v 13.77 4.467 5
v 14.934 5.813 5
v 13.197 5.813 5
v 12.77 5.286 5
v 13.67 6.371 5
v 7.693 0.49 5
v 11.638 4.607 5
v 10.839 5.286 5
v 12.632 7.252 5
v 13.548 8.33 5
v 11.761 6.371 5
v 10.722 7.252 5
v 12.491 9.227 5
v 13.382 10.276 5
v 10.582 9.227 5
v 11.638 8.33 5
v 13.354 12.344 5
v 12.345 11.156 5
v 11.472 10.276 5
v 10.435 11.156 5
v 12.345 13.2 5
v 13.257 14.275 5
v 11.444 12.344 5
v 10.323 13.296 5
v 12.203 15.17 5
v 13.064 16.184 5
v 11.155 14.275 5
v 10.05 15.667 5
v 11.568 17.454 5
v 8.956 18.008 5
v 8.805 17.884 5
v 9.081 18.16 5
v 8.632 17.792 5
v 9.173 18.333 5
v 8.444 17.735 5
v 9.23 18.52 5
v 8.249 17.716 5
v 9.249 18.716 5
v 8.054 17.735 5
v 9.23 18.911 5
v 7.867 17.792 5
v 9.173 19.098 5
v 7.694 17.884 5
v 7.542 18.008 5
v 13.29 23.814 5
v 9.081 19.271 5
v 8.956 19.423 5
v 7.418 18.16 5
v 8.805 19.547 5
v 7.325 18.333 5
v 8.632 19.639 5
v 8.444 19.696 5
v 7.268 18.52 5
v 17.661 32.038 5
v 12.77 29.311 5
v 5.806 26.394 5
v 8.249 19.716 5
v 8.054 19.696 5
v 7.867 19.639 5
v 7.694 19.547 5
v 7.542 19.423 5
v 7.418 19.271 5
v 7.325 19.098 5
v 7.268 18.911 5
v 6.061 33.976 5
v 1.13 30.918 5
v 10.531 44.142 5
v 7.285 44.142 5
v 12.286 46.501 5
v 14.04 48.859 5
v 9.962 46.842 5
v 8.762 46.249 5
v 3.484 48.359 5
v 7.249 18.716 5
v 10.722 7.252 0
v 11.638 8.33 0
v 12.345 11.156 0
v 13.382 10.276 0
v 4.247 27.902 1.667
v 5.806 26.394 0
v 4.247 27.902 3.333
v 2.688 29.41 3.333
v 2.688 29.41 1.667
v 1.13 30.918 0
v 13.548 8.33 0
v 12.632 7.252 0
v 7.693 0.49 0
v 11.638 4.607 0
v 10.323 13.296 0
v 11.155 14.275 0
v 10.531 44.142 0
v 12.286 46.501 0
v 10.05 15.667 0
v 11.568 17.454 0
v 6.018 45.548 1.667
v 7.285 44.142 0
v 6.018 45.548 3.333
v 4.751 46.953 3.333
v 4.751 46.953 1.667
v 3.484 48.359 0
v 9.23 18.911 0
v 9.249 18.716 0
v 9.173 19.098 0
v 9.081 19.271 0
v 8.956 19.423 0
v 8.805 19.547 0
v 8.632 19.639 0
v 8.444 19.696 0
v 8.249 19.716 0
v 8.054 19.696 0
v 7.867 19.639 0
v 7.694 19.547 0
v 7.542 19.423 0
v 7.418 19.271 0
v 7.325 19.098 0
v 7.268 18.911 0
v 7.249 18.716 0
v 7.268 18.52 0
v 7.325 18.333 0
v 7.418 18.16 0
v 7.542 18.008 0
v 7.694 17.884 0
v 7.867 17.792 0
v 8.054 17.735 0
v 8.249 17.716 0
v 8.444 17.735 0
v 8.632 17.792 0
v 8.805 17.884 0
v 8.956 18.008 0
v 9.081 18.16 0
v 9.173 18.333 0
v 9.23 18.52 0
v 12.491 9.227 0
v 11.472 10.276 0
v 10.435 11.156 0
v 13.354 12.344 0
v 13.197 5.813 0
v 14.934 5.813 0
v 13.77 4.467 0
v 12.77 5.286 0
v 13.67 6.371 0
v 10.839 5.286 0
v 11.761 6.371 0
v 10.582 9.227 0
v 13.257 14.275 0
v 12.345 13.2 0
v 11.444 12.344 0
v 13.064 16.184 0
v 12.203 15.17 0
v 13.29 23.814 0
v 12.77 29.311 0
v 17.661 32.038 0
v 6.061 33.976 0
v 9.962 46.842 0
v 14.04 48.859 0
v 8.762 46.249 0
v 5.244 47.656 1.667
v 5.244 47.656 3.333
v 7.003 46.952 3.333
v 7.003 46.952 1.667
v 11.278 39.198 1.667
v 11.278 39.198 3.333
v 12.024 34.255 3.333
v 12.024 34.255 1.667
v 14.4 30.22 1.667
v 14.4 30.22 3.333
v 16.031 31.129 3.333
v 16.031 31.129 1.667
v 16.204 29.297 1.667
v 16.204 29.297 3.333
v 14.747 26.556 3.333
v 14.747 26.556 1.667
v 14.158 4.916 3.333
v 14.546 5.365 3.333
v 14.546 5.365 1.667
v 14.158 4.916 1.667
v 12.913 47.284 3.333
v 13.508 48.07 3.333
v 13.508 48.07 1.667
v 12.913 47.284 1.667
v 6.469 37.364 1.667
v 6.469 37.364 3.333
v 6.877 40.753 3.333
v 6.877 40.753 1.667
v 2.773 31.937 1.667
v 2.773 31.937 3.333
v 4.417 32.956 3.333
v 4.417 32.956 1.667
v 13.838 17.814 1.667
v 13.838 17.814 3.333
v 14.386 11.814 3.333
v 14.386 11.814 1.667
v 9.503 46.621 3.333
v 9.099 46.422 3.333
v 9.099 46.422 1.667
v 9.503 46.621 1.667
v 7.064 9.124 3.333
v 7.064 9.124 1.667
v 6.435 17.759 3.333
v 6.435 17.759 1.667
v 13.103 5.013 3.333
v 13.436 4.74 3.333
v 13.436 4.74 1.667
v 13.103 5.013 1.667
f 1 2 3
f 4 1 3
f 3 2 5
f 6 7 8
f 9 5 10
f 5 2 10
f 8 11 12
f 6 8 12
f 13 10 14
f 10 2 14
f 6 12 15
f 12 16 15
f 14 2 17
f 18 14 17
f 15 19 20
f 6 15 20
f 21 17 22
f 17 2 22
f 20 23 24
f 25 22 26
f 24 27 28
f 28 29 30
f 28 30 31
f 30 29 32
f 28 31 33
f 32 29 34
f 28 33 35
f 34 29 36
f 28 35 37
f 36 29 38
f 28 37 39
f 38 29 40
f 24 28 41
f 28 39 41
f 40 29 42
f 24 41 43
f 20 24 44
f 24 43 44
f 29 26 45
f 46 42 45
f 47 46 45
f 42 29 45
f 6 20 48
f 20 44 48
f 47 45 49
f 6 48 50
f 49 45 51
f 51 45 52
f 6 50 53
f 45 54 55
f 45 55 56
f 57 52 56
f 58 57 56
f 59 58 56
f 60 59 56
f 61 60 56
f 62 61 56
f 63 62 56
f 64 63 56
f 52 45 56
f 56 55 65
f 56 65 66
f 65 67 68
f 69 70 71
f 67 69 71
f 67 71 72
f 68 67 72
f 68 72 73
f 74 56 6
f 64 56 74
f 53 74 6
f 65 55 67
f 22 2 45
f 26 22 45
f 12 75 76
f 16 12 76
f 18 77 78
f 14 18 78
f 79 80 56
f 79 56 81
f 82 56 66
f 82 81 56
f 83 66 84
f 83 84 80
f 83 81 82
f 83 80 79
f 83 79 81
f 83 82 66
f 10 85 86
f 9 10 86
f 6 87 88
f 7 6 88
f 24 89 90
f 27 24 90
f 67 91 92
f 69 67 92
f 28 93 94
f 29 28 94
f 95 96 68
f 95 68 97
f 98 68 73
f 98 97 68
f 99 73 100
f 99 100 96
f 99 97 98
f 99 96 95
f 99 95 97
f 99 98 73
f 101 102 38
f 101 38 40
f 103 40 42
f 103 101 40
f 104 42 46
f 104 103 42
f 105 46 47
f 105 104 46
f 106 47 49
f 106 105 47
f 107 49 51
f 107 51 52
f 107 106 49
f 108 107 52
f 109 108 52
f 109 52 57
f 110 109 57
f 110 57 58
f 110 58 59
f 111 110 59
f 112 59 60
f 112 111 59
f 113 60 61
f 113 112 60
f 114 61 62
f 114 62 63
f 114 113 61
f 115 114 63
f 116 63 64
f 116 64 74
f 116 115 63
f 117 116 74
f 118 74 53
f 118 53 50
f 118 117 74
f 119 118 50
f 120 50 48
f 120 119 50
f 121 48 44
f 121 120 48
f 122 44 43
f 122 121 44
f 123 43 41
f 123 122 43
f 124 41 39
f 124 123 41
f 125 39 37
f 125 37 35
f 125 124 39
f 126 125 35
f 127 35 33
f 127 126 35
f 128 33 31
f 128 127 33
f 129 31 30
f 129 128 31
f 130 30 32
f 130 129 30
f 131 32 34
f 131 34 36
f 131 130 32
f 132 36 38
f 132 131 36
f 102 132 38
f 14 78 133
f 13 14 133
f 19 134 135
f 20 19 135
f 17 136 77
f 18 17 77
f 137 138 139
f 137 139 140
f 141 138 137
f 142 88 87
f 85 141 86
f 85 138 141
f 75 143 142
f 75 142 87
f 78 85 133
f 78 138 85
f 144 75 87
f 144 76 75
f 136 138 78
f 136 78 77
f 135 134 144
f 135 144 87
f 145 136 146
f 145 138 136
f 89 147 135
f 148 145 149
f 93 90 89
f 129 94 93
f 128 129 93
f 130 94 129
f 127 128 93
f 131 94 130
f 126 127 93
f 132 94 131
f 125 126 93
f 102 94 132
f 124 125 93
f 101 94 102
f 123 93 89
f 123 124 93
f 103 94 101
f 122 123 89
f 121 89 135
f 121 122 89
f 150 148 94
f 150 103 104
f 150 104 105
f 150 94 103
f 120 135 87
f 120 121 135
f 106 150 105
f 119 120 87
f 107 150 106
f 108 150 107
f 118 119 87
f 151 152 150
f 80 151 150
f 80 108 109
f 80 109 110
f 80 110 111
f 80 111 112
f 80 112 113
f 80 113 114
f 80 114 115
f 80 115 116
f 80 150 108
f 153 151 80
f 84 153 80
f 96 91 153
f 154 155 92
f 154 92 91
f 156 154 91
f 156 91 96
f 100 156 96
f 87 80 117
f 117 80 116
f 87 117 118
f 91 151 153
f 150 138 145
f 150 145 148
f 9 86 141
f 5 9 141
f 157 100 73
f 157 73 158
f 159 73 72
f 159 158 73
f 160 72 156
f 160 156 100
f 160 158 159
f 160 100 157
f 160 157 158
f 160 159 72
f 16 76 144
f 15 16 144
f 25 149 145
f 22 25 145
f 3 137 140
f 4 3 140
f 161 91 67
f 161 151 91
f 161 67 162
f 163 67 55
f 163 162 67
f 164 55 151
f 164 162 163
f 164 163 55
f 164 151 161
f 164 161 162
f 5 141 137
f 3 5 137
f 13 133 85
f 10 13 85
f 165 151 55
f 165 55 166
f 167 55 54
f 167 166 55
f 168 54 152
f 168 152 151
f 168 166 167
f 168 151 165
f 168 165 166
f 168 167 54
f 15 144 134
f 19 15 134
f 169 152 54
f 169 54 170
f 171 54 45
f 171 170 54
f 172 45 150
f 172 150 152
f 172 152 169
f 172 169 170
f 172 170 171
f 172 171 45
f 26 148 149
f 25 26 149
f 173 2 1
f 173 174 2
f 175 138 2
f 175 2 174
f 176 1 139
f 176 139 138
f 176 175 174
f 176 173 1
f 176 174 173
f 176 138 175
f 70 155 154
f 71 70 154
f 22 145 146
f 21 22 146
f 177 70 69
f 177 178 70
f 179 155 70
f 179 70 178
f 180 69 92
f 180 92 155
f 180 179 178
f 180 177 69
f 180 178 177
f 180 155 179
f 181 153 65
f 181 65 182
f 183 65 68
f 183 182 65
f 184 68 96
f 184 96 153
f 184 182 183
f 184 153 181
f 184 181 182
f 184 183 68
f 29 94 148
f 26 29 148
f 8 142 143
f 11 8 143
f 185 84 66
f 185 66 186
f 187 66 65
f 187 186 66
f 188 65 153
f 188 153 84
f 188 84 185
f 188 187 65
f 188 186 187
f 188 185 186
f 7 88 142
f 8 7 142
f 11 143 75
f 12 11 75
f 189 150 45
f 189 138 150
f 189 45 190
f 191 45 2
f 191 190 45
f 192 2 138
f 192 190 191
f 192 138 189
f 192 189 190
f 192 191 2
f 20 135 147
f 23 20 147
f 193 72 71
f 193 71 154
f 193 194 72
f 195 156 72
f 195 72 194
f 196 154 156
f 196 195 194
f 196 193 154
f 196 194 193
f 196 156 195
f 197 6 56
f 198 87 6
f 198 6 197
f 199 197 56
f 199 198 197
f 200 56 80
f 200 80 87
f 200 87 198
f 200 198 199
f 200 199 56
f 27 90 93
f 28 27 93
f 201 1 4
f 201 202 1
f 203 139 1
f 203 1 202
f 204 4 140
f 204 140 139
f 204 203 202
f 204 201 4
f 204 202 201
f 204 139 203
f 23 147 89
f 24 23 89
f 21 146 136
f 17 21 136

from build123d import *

# Parameters (mm, degrees)
F0_R     = 1
F1_DEPTH = 5


with BuildPart() as f1:
    # F0 (on Top) → F1 (new body)
    with BuildSketch(Plane.XY):
        with BuildLine():
            add(Edge.make_bspline(
                [(7.693045, 0.489857), (7.064082, 9.124408), (6.435119, 17.758959), (5.806156, 26.39351)],
                knots=[0, 0, 0, 0, 25.972286, 25.972286, 25.972286, 25.972286], degree=3))
            Line((7.693045, 0.489857), (11.638039, 4.607475))
            Line((11.638039, 4.607475), (10.839293, 5.28573))
            Line((10.839293, 5.28573), (11.760553, 6.370649))
            Line((11.760553, 6.370649), (10.722407, 7.252192))
            Line((10.722407, 7.252192), (11.638039, 8.330484))
            Line((11.638039, 8.330484), (10.581676, 9.227495))
            Line((10.581676, 9.227495), (11.471978, 10.275956))
            Line((11.471978, 10.275956), (10.435367, 11.156196))
            Line((10.435367, 11.156196), (11.443965, 12.343969))
            Line((11.443965, 12.343969), (10.32334, 13.295549))
            Line((10.32334, 13.295549), (11.154807, 14.274724))
            Line((11.154807, 14.274724), (10.050478, 15.66664))
            Line((10.050478, 15.66664), (11.568329, 17.454133))
            Line((11.568329, 17.454133), (13.063904, 16.184165))
            Line((13.063904, 16.184165), (12.202819, 15.170112))
            Line((12.202819, 15.170112), (13.257269, 14.274724))
            Line((13.257269, 14.274724), (12.345023, 13.200421))
            Line((12.345023, 13.200421), (13.353622, 12.343969))
            Line((13.353622, 12.343969), (12.345023, 11.156196))
            Line((12.345023, 11.156196), (13.381635, 10.275956))
            Line((13.381635, 10.275956), (12.491333, 9.227495))
            Line((12.491333, 9.227495), (13.547695, 8.330484))
            Line((13.547695, 8.330484), (12.632063, 7.252192))
            Line((12.632063, 7.252192), (13.67021, 6.370649))
            Line((13.67021, 6.370649), (13.197073, 5.813461))
            Line((13.197073, 5.813461), (12.770227, 5.28573))
            add(Edge.make_bspline(
                [(13.769604, 4.466838), (13.436479, 4.739802), (13.103353, 5.012766), (12.770227, 5.28573)],
                knots=[0, 0, 0, 0, 1.292029, 1.292029, 1.292029, 1.292029], degree=3))
            add(Edge.make_bspline(
                [(14.934251, 5.813461), (14.546035, 5.364587), (14.15782, 4.915712), (13.769604, 4.466838)],
                knots=[0, 0, 0, 0, 1.780392, 1.780392, 1.780392, 1.780392], degree=3))
            add(Edge.make_bspline(
                [(13.289604, 23.814345), (13.83782, 17.81405), (14.386036, 11.813755), (14.934251, 5.813461)],
                knots=[0, 0, 0, 0, 18.075859, 18.075859, 18.075859, 18.075859], degree=3))
            add(Edge.make_bspline(
                [(17.661029, 32.037817), (16.203888, 29.29666), (14.746746, 26.555502), (13.289604, 23.814345)],
                knots=[0, 0, 0, 0, 9.313155, 9.313155, 9.313155, 9.313155], degree=3))
            add(Edge.make_bspline(
                [(12.770227, 29.311087), (14.400495, 30.219997), (16.030762, 31.128907), (17.661029, 32.037817)],
                knots=[0, 0, 0, 0, 5.599554, 5.599554, 5.599554, 5.599554], degree=3))
            add(Edge.make_bspline(
                [(10.531368, 44.142015), (11.277654, 39.198373), (12.023941, 34.25473), (12.770227, 29.311087)],
                knots=[0, 0, 0, 0, 14.998964, 14.998964, 14.998964, 14.998964], degree=3))
            add(Edge.make_bspline(
                [(12.2857, 46.500597), (11.653371, 45.717337), (11.021041, 44.934078), (10.531368, 44.142015)],
                knots=[2.939488, 2.939488, 2.939488, 2.939488, 5.878976, 5.878976, 5.878976, 5.878976], degree=3))
            Line((12.2857, 46.500597), (14.040033, 48.859179))
            add(Edge.make_bspline(
                [(9.96209, 46.84221), (11.217791, 47.44206), (12.906654, 48.222175), (14.040033, 48.859179)],
                knots=[1.635184, 1.635184, 1.635184, 1.635184, 5.888303, 5.888303, 5.888303, 5.888303], degree=3))
            Line((9.96209, 46.84221), (8.762033, 46.248656))
            add(Edge.make_bspline(
                [(3.484468, 48.358951), (5.243656, 47.655519), (7.002845, 46.952087), (8.762033, 46.248656)],
                knots=[0, 0, 0, 0, 5.68384, 5.68384, 5.68384, 5.68384], degree=3))
            add(Edge.make_bspline(
                [(7.285437, 44.142015), (6.018447, 45.54766), (4.751458, 46.953306), (3.484468, 48.358951)],
                knots=[0, 0, 0, 0, 5.677139, 5.677139, 5.677139, 5.677139], degree=3))
            add(Edge.make_bspline(
                [(6.060782, 33.975713), (6.469, 37.36448), (6.877219, 40.753248), (7.285437, 44.142015)],
                knots=[0, 0, 0, 0, 10.239799, 10.239799, 10.239799, 10.239799], degree=3))
            add(Edge.make_bspline(
                [(1.129528, 30.918069), (2.773279, 31.937284), (4.417031, 32.956498), (6.060782, 33.975713)],
                knots=[0, 0, 0, 0, 5.80228, 5.80228, 5.80228, 5.80228], degree=3))
            add(Edge.make_bspline(
                [(5.806156, 26.39351), (4.24728, 27.901697), (2.688404, 29.409883), (1.129528, 30.918069)],
                knots=[0, 0, 0, 0, 6.50711, 6.50711, 6.50711, 6.50711], degree=3))
        make_face()
        with Locations((8.249205, 18.715588)):
            Circle(F0_R, mode=Mode.SUBTRACT)
        with BuildLine():
            add(Edge.make_bspline(
                [(8.762033, 46.248656), (9.060568, 46.40761), (9.479315, 46.611587), (9.96209, 46.84221)],
                knots=[0, 0, 0, 0, 1.635184, 1.635184, 1.635184, 1.635184], degree=3))
            Line((8.762033, 46.248656), (9.96209, 46.84221))
        make_face()
        with BuildLine():
            Line((14.040033, 48.859179), (9.96209, 46.84221))
            add(Edge.make_bspline(
                [(9.96209, 46.84221), (11.217791, 47.44206), (12.906654, 48.222175), (14.040033, 48.859179)],
                knots=[1.635184, 1.635184, 1.635184, 1.635184, 5.888303, 5.888303, 5.888303, 5.888303], degree=3))
        make_face()
        with BuildLine():
            add(Edge.make_bspline(
                [(14.040033, 48.859179), (13.550359, 48.067116), (12.91803, 47.283857), (12.2857, 46.500597)],
                knots=[0, 0, 0, 0, 2.939488, 2.939488, 2.939488, 2.939488], degree=3))
            Line((14.040033, 48.859179), (12.2857, 46.500597))
        make_face()
        with BuildLine():
            Line((10.531368, 44.142015), (12.2857, 46.500597))
            add(Edge.make_bspline(
                [(12.2857, 46.500597), (11.653371, 45.717337), (11.021041, 44.934078), (10.531368, 44.142015)],
                knots=[2.939488, 2.939488, 2.939488, 2.939488, 5.878976, 5.878976, 5.878976, 5.878976], degree=3))
        make_face()
    extrude(amount=F1_DEPTH)


solid = f1.part
